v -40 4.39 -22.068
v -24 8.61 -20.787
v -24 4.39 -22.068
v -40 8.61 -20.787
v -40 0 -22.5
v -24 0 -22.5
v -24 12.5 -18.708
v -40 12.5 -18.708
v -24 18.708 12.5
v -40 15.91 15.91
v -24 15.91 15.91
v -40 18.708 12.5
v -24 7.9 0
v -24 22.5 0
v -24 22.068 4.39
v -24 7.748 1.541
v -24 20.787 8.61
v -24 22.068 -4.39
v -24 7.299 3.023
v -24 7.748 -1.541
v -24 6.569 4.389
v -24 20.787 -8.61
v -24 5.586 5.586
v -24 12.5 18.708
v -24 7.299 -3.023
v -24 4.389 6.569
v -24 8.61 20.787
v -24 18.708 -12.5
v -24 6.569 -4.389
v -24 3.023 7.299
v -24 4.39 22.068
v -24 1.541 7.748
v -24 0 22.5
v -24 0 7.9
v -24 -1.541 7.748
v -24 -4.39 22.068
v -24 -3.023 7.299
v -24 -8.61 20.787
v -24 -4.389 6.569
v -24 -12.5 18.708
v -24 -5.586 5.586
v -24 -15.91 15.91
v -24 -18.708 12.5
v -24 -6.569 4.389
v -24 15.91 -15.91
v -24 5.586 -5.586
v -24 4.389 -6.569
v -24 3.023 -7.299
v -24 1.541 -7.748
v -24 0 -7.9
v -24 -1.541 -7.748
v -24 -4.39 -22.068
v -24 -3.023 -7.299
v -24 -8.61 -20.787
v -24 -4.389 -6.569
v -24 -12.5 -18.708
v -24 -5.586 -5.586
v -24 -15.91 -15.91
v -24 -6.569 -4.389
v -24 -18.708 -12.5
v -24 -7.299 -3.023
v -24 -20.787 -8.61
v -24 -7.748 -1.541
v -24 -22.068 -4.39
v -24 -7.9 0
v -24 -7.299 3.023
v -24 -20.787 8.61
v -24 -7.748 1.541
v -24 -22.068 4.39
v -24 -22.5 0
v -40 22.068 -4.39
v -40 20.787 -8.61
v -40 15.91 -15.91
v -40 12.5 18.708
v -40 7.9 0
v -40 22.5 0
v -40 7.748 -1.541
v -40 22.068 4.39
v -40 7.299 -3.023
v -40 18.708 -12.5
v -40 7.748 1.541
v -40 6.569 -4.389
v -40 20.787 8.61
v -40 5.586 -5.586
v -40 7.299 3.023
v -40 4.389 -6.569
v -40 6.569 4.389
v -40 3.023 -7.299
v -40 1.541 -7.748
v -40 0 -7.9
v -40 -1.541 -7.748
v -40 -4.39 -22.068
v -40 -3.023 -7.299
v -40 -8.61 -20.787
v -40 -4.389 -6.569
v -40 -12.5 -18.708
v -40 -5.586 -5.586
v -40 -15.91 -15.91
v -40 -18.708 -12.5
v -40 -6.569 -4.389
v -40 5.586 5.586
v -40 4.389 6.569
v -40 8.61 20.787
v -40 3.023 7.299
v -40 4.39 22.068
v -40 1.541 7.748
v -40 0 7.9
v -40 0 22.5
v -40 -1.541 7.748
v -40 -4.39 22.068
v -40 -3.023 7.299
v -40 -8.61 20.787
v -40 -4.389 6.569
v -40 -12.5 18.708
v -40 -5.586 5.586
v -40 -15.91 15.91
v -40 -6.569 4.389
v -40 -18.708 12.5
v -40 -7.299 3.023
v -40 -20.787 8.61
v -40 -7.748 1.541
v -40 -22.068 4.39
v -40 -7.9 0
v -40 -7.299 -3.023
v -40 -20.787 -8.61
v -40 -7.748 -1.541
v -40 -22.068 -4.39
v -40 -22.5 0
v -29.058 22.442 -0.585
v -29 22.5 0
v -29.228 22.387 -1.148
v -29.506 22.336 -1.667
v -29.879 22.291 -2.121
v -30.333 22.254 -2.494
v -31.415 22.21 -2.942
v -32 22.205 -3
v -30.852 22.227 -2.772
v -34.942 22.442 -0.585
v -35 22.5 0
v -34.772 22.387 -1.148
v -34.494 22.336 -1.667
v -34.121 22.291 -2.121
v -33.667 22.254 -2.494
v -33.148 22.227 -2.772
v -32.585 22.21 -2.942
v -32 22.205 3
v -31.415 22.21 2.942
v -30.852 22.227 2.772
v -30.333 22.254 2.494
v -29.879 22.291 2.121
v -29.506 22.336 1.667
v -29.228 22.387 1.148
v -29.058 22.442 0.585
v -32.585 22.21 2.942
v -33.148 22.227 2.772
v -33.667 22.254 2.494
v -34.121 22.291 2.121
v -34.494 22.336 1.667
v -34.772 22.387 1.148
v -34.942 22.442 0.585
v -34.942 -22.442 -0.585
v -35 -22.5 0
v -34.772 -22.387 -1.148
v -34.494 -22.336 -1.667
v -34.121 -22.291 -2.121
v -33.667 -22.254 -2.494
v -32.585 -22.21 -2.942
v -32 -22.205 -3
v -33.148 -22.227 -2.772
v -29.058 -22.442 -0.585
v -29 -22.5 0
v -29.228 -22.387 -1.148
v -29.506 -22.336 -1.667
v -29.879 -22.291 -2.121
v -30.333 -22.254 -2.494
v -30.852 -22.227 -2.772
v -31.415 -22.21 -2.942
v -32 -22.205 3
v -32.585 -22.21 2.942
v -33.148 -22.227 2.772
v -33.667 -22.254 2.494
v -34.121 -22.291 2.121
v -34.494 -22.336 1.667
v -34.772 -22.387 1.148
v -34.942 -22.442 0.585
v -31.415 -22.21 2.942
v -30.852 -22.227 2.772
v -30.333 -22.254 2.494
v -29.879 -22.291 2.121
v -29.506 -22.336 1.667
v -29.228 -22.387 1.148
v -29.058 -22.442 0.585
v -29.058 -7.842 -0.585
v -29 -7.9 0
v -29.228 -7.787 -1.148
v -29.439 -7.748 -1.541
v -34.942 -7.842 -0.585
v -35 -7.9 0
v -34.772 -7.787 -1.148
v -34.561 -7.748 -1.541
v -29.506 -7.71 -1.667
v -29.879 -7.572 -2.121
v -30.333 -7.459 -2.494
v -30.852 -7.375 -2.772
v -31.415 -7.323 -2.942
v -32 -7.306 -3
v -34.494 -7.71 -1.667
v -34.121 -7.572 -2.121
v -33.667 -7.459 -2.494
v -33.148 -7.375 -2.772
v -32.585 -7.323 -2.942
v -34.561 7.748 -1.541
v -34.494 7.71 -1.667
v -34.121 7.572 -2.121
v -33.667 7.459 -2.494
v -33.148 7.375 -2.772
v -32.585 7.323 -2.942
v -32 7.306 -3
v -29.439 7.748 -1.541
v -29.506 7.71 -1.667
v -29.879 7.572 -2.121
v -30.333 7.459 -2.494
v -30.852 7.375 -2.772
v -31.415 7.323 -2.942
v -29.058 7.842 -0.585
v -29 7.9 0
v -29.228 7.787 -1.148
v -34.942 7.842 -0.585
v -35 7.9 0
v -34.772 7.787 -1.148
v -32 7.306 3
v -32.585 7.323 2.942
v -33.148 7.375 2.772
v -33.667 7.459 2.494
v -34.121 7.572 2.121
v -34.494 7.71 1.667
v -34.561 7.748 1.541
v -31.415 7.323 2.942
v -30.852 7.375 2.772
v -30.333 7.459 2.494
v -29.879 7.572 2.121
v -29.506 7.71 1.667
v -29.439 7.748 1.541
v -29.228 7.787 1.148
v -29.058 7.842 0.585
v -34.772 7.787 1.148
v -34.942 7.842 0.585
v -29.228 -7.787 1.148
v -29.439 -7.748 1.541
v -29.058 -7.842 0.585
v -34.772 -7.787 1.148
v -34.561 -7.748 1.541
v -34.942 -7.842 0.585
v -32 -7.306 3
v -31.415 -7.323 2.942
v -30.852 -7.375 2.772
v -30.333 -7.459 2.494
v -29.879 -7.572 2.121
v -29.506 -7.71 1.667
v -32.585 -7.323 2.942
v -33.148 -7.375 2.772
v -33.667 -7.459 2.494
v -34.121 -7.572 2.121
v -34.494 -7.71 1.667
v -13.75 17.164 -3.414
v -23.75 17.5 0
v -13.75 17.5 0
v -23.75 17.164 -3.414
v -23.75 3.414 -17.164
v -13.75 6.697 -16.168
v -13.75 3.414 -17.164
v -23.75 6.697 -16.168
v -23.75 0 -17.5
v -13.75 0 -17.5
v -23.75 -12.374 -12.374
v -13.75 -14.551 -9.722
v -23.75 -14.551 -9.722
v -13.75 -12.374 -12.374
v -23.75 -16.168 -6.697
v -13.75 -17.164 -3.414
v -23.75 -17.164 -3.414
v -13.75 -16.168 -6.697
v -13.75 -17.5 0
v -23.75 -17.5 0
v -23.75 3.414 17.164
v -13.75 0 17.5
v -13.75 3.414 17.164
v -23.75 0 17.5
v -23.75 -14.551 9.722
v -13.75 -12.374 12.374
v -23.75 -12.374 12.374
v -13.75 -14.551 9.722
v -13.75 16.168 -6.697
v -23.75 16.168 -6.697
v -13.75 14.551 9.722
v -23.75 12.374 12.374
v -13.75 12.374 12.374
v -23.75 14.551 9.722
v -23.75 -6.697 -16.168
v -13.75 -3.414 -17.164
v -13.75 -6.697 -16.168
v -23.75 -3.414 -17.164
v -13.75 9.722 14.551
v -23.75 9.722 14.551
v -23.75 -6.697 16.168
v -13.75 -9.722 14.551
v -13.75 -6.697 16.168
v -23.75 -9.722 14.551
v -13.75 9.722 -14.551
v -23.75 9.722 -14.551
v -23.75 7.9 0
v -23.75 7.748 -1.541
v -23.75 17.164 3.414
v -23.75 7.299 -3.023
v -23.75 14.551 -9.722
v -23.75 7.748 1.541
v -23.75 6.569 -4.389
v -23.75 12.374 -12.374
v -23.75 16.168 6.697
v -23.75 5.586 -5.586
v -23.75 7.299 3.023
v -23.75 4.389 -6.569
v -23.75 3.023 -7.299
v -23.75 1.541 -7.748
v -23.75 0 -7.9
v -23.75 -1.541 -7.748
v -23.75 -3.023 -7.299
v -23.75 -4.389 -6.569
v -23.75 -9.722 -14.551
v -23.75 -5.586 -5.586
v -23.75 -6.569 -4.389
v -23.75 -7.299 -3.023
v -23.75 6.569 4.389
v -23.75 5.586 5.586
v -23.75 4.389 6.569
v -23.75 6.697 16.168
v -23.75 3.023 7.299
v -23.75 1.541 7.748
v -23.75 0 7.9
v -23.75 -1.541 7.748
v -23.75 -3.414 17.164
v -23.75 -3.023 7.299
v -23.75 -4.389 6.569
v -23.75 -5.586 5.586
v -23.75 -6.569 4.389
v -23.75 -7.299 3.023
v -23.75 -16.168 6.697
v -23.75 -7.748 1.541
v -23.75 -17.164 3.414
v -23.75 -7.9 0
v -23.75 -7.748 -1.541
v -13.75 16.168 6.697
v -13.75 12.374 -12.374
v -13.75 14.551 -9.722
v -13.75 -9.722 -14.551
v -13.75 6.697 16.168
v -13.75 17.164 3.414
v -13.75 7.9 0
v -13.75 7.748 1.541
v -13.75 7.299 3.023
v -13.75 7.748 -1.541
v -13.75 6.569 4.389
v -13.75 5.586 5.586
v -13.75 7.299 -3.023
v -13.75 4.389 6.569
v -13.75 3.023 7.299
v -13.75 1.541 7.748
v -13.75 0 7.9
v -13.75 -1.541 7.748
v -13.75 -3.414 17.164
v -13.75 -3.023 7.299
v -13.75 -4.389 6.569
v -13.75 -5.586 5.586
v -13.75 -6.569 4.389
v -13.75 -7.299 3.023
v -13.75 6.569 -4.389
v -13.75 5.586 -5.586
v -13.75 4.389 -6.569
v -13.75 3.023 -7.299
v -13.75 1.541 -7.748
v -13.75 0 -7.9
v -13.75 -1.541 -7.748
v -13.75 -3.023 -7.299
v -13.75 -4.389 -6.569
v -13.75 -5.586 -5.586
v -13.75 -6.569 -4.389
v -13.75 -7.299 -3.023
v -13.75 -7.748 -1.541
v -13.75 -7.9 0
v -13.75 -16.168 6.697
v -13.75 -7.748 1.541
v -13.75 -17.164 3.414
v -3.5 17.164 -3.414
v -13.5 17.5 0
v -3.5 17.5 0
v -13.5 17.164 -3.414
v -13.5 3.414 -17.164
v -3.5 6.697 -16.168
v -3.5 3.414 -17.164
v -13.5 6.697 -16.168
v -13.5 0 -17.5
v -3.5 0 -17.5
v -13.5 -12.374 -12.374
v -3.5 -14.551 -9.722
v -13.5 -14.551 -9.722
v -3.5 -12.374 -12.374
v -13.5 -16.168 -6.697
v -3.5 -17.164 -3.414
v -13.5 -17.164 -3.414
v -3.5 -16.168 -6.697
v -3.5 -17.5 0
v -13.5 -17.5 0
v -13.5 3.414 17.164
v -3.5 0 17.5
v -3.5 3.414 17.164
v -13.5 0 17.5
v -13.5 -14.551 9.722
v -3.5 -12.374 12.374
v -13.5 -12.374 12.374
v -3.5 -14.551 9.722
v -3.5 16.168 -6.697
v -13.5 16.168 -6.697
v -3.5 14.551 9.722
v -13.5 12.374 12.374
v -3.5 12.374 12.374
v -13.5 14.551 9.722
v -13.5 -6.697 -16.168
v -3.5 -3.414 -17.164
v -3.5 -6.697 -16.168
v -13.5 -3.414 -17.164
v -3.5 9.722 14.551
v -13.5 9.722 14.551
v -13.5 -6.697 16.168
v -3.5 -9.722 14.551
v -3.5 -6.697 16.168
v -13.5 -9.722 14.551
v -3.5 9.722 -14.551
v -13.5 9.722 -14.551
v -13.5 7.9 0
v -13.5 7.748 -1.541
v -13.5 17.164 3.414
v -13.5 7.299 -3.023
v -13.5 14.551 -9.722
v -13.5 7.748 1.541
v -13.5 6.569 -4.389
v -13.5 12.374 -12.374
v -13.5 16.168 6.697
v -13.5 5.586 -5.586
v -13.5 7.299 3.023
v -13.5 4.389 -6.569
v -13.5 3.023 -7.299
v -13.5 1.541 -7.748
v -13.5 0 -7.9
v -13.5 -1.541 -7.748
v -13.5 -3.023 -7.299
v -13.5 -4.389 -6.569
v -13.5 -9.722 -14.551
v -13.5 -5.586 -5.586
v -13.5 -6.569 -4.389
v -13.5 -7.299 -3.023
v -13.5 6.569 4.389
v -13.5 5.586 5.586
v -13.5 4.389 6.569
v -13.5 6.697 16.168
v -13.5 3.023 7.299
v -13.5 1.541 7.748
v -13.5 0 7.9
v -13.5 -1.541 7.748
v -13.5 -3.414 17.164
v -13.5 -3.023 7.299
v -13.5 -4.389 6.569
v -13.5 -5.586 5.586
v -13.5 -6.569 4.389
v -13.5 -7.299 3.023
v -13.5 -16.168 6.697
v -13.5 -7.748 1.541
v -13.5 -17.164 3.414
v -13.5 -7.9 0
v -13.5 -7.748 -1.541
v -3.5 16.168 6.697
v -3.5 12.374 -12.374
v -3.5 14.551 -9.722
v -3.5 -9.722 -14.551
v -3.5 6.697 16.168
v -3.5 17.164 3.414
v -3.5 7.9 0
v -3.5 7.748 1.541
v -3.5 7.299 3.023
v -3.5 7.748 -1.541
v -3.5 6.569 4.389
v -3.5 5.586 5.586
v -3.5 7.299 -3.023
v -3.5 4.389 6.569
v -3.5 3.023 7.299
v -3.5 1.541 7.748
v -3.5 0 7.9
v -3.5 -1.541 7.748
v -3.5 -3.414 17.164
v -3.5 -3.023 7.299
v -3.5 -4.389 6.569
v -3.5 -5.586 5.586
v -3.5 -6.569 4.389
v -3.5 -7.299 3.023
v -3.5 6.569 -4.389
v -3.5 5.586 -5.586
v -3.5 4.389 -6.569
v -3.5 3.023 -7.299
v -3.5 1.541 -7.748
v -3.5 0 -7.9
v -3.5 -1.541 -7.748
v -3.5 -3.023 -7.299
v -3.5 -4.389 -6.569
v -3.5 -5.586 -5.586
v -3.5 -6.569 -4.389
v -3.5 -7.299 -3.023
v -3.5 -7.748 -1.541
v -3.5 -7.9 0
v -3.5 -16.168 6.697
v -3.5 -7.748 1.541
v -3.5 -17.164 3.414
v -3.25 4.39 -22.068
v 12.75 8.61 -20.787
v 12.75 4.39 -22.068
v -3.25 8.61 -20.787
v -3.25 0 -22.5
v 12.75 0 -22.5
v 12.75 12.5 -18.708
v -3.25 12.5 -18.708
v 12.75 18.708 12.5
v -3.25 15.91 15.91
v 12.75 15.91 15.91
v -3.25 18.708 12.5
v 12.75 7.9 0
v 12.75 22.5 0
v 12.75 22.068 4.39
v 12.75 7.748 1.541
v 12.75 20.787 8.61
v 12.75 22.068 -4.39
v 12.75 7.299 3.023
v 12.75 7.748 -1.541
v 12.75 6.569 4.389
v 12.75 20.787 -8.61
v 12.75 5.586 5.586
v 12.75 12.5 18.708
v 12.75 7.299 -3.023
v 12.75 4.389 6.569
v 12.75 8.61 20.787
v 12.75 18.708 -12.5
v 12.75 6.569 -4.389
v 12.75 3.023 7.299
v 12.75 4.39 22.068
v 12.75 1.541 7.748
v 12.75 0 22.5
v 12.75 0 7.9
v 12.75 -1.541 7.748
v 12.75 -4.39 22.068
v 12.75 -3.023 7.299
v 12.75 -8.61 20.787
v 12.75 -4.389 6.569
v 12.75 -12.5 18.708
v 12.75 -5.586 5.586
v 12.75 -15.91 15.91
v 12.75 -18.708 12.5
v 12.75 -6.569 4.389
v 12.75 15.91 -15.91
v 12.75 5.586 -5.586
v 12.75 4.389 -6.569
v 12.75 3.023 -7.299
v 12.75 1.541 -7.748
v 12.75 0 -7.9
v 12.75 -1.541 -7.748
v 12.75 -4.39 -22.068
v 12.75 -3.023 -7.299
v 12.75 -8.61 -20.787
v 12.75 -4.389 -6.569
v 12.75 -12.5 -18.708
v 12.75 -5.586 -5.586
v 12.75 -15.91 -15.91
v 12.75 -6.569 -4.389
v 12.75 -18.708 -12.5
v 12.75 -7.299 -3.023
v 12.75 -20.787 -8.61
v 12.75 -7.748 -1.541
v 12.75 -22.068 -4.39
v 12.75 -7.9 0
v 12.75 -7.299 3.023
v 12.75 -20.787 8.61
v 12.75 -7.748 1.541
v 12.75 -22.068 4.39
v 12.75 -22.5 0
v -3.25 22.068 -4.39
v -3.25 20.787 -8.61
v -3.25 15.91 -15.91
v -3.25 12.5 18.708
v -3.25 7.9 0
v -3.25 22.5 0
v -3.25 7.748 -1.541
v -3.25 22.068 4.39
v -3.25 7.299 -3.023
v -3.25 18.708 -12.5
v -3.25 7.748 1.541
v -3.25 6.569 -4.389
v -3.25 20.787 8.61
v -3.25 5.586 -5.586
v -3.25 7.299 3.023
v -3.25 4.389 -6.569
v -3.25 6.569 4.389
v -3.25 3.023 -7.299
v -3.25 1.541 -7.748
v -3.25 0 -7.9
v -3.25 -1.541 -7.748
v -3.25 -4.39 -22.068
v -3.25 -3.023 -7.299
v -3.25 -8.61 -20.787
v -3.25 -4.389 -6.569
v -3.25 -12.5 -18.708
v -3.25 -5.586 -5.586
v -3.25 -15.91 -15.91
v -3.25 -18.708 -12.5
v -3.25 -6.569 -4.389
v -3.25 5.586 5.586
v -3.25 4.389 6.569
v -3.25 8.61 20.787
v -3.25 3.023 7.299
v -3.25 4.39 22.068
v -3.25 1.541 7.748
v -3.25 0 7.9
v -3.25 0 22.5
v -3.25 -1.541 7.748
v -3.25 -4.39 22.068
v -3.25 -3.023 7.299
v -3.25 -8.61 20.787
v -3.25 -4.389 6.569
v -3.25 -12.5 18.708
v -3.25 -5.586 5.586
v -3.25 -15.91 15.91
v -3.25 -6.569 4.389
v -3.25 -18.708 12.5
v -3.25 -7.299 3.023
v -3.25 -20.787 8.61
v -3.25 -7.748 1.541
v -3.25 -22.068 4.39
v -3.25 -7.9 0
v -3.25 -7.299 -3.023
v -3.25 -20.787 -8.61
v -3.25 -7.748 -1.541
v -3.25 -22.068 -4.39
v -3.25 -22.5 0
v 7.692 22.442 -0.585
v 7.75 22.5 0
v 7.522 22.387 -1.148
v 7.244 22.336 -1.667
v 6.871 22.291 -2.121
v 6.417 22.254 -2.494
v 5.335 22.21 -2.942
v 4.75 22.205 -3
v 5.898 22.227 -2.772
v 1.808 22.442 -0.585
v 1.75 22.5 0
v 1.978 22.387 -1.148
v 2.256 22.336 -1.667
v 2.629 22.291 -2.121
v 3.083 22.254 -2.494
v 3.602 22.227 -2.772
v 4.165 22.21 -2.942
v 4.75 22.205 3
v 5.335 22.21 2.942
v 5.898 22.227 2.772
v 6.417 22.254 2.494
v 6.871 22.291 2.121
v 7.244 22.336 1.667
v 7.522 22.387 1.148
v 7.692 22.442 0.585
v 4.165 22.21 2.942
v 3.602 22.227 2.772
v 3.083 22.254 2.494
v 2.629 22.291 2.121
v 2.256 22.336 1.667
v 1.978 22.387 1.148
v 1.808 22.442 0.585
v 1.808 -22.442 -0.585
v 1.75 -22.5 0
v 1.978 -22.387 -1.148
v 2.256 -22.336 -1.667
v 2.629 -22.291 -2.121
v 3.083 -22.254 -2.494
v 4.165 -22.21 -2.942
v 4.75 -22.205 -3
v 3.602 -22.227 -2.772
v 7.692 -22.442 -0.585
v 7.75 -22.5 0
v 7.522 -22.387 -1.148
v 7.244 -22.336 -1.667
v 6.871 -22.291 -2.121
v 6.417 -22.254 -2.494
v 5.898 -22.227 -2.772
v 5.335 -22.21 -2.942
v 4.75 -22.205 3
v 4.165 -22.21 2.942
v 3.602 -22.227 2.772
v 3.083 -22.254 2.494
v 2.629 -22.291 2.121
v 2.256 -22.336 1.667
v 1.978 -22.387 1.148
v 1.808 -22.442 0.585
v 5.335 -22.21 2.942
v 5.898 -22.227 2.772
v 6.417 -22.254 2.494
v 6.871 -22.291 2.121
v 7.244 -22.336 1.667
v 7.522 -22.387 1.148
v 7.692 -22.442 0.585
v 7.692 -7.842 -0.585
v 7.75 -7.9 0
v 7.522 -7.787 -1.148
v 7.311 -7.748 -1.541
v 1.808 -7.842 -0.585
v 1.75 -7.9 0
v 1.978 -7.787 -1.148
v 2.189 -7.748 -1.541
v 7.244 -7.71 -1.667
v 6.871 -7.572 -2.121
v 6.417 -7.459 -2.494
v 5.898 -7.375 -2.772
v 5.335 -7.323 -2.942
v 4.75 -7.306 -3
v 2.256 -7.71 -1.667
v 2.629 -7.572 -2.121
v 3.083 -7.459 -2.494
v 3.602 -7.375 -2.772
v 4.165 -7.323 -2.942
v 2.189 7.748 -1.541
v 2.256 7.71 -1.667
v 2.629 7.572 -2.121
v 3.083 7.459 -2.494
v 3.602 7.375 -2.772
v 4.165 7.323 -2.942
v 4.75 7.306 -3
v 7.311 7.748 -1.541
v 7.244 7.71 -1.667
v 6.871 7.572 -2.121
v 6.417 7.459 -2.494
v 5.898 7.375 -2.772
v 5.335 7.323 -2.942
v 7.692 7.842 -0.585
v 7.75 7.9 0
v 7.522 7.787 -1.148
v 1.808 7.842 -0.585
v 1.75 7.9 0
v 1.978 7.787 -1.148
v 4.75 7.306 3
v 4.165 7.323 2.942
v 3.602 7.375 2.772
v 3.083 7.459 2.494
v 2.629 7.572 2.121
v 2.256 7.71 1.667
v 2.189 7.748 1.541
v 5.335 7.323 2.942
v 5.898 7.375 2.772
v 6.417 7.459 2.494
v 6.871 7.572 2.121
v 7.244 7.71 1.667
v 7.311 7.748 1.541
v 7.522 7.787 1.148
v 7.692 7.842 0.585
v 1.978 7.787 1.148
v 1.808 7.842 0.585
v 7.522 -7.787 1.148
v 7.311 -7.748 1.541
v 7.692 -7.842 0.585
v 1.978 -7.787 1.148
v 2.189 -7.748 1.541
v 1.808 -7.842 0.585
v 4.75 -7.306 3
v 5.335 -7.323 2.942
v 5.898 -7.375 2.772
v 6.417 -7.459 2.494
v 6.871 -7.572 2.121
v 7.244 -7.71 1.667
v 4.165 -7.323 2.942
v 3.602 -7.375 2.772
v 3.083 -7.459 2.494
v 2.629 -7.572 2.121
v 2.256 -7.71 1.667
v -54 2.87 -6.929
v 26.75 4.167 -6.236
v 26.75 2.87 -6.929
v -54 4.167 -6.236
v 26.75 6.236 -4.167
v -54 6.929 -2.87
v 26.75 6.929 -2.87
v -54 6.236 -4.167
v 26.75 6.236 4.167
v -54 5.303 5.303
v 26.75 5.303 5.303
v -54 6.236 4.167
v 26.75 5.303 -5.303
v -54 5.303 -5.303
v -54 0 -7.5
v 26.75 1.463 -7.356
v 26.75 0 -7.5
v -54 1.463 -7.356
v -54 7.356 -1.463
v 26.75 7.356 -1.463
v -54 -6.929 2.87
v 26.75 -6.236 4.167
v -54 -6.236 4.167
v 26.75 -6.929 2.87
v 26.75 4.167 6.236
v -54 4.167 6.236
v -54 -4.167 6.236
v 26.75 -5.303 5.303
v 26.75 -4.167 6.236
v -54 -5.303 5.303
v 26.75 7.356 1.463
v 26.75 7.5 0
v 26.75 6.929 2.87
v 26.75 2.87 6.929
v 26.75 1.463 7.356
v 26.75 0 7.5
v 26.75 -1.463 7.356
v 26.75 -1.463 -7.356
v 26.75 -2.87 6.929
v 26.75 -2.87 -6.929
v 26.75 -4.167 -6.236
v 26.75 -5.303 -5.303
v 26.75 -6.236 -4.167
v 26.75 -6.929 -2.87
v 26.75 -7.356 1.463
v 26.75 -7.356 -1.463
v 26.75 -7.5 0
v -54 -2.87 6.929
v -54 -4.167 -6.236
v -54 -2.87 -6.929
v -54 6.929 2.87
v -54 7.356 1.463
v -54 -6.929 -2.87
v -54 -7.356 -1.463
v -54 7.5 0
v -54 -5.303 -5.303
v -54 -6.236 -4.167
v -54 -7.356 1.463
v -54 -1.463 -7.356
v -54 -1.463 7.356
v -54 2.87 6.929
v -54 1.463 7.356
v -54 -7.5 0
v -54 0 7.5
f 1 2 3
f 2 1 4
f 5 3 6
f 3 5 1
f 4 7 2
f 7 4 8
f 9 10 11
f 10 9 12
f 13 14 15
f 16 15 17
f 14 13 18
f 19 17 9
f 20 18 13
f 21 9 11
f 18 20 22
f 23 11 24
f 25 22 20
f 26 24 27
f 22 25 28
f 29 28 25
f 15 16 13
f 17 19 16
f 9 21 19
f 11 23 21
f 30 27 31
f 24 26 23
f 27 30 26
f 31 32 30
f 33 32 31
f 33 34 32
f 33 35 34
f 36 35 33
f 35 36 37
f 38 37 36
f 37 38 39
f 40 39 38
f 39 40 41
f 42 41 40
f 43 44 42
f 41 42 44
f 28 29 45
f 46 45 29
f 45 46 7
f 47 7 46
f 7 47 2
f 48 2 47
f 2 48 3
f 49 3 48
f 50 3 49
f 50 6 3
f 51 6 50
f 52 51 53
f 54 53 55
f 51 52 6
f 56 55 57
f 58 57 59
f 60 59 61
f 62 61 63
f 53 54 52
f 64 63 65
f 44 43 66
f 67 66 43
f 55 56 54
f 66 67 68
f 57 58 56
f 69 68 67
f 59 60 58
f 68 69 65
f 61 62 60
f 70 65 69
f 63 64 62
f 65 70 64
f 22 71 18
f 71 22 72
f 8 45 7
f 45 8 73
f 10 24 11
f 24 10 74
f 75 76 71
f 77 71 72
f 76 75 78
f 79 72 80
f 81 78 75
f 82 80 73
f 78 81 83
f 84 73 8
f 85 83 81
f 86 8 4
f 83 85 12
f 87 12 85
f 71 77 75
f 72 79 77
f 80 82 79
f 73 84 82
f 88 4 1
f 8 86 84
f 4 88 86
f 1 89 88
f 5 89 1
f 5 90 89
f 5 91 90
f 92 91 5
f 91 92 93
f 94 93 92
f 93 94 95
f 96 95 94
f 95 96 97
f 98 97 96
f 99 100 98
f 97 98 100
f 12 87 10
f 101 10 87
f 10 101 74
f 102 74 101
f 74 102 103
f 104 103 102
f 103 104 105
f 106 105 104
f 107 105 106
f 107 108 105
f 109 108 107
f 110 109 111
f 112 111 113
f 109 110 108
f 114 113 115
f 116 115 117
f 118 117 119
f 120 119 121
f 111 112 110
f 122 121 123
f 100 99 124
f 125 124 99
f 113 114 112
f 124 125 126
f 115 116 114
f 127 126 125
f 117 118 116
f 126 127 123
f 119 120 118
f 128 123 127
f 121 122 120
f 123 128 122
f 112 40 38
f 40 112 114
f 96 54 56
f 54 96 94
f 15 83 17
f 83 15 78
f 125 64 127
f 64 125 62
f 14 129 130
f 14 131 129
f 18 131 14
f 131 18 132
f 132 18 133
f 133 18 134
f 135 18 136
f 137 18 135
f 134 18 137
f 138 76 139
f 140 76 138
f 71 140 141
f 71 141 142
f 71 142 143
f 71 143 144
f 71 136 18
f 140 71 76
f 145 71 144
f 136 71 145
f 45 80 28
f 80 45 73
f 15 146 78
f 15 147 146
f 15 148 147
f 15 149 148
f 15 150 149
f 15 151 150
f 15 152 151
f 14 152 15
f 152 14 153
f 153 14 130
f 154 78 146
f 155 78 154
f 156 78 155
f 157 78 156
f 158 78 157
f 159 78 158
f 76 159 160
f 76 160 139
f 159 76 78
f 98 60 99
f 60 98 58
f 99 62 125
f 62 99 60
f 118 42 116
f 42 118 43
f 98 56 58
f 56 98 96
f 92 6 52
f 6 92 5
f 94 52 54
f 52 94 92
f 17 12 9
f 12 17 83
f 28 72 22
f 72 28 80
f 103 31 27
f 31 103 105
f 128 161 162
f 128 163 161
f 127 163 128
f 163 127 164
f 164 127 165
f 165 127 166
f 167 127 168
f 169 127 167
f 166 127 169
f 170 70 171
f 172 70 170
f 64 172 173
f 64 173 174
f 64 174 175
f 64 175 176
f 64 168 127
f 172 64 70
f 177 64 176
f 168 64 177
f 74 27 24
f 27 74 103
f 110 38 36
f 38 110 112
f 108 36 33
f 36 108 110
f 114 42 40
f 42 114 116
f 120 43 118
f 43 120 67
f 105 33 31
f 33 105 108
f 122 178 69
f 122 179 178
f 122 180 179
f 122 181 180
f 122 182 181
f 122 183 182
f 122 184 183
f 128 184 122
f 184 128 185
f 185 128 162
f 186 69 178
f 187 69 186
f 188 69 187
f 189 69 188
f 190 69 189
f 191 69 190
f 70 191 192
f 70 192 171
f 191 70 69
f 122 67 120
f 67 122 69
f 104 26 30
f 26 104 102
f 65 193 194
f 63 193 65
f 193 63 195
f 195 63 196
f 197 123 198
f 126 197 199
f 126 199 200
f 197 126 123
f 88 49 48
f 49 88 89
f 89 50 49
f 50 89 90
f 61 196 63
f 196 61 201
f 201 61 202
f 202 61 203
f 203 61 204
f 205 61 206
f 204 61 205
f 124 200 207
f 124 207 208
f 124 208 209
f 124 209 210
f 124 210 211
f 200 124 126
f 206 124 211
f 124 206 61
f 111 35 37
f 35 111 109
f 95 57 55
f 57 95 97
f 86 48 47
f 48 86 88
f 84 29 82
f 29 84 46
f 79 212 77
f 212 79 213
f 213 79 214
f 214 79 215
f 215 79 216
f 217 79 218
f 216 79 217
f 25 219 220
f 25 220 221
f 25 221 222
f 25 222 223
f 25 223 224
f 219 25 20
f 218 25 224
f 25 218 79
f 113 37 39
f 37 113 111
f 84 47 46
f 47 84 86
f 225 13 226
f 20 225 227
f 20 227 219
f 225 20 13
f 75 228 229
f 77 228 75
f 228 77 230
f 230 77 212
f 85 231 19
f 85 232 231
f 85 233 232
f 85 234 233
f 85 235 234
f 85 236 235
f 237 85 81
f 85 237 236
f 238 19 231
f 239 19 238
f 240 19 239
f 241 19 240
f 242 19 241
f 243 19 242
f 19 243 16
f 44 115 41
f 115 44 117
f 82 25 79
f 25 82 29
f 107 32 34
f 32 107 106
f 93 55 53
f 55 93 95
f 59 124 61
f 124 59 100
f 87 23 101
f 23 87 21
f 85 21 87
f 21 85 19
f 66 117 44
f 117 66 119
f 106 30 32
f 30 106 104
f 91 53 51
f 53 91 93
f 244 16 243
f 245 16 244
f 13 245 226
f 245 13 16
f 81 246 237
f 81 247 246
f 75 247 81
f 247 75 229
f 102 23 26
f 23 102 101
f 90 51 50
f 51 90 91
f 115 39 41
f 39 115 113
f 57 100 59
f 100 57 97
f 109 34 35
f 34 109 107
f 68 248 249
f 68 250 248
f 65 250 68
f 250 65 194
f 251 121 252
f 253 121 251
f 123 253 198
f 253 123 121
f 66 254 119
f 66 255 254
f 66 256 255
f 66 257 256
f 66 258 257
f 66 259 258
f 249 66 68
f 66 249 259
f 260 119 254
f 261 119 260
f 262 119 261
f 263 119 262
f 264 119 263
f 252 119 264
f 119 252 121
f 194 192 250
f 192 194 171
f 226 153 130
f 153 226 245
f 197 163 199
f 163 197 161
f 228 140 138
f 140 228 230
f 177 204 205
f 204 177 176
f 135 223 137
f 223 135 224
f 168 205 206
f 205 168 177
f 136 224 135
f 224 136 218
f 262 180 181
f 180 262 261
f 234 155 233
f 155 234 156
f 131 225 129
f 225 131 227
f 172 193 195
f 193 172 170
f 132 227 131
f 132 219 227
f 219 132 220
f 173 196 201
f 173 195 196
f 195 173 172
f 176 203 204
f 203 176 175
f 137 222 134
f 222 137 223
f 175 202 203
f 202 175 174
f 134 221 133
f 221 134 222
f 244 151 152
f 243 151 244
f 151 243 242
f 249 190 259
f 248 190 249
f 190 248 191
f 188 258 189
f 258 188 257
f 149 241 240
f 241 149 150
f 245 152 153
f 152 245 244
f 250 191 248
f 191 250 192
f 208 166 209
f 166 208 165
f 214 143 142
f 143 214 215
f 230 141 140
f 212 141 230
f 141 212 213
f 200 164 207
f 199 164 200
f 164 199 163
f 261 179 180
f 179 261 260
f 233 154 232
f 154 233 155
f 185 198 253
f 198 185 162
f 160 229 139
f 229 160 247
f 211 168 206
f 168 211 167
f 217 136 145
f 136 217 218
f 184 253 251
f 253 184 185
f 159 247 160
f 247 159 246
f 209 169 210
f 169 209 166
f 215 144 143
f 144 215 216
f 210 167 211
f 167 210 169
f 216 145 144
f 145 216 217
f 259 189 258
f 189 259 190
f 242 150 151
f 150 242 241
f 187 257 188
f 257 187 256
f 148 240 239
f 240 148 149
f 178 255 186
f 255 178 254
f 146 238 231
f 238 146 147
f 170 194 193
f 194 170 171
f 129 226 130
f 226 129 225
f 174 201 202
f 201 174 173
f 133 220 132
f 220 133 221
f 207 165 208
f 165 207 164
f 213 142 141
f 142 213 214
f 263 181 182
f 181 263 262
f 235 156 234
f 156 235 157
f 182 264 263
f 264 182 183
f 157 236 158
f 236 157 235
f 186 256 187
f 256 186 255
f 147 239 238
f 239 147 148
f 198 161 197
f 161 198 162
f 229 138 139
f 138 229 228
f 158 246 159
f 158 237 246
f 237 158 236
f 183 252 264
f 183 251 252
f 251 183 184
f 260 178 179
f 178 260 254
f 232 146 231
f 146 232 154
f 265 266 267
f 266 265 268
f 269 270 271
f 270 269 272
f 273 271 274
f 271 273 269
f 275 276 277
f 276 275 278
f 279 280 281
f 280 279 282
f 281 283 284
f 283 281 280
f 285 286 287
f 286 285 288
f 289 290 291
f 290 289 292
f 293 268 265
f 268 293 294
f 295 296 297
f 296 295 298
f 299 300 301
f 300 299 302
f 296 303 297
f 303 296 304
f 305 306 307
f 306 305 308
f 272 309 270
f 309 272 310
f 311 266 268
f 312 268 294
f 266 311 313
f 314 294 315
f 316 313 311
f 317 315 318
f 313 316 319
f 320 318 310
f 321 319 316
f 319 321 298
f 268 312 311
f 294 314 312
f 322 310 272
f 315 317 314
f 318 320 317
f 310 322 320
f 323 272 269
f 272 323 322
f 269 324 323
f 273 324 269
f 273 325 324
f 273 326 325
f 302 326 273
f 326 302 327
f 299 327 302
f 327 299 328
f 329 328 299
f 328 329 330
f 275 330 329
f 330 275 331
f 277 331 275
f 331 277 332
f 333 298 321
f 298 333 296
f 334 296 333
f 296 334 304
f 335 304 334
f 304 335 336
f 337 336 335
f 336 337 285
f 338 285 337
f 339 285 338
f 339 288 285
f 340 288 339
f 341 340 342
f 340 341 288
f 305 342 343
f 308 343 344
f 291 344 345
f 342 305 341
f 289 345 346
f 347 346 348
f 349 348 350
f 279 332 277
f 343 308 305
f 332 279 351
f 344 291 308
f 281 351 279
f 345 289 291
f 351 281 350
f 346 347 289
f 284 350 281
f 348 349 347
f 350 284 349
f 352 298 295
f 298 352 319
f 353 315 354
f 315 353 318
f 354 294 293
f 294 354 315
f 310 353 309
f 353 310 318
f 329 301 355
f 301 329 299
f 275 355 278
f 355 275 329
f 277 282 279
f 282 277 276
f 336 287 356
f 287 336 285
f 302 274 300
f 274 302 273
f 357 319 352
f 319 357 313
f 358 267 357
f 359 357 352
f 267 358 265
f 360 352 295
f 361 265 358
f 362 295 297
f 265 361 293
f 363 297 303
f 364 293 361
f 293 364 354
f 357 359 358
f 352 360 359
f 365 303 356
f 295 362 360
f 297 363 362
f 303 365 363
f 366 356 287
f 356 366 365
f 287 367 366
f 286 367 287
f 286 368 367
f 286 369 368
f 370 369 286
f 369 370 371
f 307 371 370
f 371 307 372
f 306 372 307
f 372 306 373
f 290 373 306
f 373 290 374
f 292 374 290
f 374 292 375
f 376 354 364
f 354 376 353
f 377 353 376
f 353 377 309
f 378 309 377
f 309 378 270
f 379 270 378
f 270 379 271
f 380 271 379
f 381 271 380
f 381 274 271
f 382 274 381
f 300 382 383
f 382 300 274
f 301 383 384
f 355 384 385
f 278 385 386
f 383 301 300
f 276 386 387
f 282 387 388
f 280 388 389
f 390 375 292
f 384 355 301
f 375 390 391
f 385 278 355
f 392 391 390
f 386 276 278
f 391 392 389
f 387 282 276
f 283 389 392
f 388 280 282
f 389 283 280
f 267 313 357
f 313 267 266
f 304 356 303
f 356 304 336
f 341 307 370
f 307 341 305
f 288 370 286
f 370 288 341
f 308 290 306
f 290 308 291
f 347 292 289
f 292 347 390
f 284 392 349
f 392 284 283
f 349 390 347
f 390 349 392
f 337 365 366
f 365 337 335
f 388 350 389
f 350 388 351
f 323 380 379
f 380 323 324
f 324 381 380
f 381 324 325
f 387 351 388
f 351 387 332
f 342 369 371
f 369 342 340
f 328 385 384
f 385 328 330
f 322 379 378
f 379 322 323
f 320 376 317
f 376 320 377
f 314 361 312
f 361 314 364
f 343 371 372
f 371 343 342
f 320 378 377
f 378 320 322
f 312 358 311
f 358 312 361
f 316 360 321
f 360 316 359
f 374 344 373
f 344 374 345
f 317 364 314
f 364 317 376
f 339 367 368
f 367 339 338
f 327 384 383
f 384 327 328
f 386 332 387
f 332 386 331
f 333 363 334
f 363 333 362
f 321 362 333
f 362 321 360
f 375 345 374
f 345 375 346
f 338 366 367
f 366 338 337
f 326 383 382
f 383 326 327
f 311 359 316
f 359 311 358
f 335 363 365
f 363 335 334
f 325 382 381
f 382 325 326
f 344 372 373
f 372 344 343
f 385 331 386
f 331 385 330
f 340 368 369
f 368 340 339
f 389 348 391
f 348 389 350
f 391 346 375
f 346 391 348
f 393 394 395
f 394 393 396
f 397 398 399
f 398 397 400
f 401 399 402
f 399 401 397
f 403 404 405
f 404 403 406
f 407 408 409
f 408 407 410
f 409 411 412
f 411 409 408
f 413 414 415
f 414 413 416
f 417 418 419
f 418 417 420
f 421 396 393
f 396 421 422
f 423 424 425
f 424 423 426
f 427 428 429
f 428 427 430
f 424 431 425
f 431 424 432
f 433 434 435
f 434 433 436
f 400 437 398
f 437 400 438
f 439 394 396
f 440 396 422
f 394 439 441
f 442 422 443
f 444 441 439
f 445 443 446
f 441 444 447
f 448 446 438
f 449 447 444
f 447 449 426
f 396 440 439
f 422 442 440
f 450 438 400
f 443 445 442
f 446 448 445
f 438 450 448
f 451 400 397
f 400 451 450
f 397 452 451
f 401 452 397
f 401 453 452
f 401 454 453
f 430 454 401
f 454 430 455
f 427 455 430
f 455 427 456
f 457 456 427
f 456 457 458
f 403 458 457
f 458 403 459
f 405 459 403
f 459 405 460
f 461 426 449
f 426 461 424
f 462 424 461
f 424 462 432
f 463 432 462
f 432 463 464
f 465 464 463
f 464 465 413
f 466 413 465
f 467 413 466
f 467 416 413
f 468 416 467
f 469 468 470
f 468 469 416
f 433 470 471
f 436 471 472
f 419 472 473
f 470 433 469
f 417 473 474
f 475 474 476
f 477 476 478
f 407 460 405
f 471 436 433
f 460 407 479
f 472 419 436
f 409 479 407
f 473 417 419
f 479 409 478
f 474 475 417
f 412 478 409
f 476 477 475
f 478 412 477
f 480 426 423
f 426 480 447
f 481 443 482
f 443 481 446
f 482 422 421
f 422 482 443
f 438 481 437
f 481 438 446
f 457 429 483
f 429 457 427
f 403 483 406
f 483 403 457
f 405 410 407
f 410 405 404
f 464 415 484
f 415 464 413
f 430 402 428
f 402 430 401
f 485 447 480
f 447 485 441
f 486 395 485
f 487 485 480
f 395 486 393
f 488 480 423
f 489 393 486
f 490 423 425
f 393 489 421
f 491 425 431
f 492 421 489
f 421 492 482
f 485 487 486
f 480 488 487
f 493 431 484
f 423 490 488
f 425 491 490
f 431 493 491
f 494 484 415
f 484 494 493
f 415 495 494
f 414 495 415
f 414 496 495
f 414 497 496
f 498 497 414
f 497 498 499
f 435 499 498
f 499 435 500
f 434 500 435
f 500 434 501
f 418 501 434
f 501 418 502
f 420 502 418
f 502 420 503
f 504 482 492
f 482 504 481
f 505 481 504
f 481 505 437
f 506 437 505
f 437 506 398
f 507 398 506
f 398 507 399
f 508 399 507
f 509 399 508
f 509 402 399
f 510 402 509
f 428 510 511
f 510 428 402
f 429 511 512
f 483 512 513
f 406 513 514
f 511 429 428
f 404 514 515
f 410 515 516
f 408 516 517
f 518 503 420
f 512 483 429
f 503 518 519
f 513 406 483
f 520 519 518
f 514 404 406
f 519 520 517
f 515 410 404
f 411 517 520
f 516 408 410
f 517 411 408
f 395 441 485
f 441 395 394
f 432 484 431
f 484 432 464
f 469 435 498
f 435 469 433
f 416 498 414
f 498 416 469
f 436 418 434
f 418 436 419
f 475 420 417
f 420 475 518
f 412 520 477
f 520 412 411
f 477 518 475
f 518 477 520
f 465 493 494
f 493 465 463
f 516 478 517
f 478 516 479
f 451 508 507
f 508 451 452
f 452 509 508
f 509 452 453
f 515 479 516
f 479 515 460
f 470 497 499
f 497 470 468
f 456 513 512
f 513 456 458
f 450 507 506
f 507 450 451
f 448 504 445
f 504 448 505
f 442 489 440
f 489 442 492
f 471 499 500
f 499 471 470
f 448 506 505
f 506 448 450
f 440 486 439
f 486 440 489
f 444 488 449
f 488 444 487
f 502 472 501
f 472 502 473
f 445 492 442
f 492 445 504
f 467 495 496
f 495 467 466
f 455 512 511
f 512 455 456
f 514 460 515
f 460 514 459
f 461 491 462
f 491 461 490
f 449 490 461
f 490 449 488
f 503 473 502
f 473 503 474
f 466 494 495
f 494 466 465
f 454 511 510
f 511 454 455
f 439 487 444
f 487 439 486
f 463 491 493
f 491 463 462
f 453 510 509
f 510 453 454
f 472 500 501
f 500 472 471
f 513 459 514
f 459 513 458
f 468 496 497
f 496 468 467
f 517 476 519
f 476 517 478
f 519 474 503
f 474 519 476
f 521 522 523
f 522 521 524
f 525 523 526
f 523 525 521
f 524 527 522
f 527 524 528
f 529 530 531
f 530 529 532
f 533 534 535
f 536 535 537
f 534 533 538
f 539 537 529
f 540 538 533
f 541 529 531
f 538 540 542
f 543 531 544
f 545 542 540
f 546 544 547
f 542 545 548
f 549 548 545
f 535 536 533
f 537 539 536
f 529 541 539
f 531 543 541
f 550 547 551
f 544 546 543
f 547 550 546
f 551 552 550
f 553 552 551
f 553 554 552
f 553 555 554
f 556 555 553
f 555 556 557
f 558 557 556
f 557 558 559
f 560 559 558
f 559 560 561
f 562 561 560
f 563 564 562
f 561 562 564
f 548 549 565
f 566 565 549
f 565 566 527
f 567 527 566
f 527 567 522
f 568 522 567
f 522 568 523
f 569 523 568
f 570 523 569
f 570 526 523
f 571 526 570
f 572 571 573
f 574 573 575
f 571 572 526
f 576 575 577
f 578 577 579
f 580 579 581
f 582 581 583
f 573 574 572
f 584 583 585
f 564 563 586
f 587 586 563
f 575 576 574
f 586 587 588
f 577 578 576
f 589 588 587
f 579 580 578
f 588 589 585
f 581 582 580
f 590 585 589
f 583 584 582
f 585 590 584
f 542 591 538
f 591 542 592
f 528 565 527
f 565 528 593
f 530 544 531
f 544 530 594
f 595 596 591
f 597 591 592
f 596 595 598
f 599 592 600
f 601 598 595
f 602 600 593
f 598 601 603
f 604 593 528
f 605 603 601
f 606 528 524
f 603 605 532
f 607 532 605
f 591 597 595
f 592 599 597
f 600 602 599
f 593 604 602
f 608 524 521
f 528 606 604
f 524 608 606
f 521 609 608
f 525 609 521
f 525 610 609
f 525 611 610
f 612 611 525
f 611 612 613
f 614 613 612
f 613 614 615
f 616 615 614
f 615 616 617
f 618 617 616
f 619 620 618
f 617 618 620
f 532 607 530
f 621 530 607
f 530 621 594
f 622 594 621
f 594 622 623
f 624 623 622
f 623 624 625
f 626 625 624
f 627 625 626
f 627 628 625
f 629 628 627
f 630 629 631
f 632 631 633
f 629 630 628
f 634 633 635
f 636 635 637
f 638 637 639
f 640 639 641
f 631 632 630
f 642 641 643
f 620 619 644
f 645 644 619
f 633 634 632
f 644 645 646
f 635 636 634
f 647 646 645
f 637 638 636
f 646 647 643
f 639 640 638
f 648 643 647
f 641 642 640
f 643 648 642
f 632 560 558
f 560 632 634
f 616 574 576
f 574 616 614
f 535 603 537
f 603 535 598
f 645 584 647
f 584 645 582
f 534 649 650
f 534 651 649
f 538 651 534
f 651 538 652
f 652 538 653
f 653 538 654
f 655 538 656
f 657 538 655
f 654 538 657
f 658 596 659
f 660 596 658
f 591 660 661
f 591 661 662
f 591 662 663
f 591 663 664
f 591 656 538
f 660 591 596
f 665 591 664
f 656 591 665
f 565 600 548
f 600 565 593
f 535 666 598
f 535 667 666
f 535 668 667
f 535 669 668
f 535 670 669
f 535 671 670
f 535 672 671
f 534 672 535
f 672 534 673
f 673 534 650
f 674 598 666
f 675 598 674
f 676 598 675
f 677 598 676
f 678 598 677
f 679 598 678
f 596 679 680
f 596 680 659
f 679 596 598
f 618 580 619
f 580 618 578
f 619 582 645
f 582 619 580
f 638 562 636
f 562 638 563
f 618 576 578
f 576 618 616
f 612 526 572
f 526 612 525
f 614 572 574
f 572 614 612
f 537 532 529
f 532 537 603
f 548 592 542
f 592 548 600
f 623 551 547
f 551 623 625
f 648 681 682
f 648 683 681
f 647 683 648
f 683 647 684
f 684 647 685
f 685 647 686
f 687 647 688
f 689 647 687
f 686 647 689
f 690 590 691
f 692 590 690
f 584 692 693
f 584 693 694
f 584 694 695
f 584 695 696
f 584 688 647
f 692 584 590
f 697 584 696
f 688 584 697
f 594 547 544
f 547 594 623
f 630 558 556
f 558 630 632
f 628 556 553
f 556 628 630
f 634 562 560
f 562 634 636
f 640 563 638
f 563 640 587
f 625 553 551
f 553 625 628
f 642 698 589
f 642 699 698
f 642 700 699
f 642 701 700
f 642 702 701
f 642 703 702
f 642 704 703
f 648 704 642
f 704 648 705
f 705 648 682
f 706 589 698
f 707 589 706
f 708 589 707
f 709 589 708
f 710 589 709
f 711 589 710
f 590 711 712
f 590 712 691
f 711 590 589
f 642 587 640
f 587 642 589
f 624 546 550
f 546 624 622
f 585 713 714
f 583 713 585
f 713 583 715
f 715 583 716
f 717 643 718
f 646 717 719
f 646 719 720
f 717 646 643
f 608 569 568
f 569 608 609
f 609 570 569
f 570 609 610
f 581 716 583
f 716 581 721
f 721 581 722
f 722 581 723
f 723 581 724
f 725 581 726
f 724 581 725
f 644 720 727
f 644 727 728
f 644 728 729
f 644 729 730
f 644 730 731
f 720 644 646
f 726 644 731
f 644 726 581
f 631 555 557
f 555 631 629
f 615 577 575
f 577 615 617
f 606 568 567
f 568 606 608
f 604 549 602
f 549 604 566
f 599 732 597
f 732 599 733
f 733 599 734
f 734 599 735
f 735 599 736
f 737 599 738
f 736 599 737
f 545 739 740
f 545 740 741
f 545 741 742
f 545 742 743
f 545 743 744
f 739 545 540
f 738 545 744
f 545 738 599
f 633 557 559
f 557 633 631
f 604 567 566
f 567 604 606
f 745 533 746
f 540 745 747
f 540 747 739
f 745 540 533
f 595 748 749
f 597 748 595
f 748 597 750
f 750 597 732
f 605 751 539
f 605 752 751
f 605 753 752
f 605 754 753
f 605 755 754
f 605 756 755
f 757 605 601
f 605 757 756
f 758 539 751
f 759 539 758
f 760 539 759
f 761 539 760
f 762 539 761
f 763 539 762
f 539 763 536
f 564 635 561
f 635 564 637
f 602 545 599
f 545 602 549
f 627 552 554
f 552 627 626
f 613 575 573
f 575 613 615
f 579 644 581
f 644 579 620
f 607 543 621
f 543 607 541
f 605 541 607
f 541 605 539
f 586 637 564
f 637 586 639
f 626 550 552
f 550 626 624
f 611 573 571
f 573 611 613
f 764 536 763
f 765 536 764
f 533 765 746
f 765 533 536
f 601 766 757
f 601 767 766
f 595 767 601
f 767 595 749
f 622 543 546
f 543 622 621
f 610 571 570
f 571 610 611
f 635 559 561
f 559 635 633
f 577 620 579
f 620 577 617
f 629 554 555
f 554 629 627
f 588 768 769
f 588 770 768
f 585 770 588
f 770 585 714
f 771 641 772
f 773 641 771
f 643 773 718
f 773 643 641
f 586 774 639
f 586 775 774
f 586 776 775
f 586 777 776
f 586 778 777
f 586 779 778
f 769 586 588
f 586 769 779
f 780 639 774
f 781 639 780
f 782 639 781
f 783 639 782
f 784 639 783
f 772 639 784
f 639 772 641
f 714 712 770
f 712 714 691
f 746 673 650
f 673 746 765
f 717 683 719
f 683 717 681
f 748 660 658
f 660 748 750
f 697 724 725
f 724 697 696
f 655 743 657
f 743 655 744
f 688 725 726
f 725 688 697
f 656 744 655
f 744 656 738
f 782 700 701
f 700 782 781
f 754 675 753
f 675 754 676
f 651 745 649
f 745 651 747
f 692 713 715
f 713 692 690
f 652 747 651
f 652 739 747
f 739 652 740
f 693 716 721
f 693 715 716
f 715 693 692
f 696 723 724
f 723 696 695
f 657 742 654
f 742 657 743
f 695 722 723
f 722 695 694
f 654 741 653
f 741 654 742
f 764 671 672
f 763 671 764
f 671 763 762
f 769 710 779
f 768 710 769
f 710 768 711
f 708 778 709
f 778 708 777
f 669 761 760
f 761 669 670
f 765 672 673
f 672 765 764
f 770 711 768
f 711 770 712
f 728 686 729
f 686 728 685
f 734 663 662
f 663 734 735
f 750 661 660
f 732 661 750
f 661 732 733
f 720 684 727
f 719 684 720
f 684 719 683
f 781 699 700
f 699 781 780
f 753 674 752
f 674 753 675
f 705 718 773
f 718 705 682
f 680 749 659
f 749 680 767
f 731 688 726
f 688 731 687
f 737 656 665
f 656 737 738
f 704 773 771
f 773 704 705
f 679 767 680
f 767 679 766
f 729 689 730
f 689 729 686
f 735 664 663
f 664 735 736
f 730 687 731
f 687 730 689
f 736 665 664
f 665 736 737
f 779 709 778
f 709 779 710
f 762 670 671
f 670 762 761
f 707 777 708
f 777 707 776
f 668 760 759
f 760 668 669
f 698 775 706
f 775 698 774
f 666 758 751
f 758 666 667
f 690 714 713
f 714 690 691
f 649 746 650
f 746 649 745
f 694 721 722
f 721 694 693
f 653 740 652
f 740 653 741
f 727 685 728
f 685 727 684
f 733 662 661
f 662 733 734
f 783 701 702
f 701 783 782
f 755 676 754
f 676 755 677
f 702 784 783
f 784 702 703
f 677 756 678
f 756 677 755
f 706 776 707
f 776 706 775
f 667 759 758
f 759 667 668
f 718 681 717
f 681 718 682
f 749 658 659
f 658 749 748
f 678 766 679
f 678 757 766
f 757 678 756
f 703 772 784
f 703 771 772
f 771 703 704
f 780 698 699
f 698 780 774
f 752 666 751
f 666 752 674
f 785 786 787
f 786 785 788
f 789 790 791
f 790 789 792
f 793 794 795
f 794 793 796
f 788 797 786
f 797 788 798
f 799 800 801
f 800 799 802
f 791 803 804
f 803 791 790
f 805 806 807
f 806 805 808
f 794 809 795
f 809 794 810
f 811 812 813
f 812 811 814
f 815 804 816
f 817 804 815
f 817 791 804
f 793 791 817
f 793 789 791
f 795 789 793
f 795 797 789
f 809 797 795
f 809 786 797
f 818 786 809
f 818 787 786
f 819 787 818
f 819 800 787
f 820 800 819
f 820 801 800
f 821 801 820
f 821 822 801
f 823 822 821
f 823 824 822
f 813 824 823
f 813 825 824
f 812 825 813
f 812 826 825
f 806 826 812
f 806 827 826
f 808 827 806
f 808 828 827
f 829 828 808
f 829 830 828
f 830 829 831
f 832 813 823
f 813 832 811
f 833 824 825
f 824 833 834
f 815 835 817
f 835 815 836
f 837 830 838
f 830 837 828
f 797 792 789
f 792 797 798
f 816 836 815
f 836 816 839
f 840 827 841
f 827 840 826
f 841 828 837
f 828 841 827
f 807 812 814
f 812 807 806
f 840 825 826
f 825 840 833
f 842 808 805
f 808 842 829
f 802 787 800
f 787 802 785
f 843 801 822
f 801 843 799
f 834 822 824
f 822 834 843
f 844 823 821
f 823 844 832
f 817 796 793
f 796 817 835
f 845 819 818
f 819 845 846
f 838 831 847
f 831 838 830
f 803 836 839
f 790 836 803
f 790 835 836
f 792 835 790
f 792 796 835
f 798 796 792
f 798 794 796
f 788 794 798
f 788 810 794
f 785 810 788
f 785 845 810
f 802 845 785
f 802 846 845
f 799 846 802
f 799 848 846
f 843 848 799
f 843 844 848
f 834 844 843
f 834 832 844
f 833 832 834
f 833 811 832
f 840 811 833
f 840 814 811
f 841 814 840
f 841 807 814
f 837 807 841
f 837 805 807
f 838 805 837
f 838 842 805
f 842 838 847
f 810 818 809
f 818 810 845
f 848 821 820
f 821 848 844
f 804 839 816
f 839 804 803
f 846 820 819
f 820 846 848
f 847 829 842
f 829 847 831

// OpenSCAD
$fn = 32;

// ------------------------------------------------------------------------
// Shaft with rings and collars: d15 shaft, 4 rings
// Every part is its own module, assembly() places them once.
// ------------------------------------------------------------------------

// --- part 1 ---
module shaft() {
  translate([0, 0, -40.375]) cylinder(h = 80.75, d = 15);
}

// --- part 2 ---
module collar_a() {
  difference() {
    cylinder(h = 16, d = 45);
    translate([0, 0, -1]) cylinder(h = 18, d = 15.8);
    translate([0, 0, 8]) rotate([90, 0, 0]) cylinder(h = 47, d = 6, center = true);
  }
}

// --- part 3 ---
module spacer_a() {
  difference() {
      translate([0, 0, 0]) cylinder(h = 10, d = 35);
      translate([0, 0, -1]) cylinder(h = 12, d = 15.8);
    }
}

// --- part 4 ---
module spacer_b() {
  difference() {
      translate([0, 0, 0]) cylinder(h = 10, d = 35);
      translate([0, 0, -1]) cylinder(h = 12, d = 15.8);
    }
}

// --- part 5 ---
module collar_b() {
  difference() {
    cylinder(h = 16, d = 45);
    translate([0, 0, -1]) cylinder(h = 18, d = 15.8);
    translate([0, 0, 8]) rotate([90, 0, 0]) cylinder(h = 47, d = 6, center = true);
  }
}

// --- assembly ---
module assembly() {
  translate([-13.625, 0, 0]) rotate([0, 90, 0]) shaft();
  translate([-40, 0, 0]) rotate([0, 90, 0]) collar_a();
  translate([-23.75, 0, 0]) rotate([0, 90, 0]) spacer_a();
  translate([-13.5, 0, 0]) rotate([0, 90, 0]) spacer_b();
  translate([-3.25, 0, 0]) rotate([0, 90, 0]) collar_b();
}

assembly();
